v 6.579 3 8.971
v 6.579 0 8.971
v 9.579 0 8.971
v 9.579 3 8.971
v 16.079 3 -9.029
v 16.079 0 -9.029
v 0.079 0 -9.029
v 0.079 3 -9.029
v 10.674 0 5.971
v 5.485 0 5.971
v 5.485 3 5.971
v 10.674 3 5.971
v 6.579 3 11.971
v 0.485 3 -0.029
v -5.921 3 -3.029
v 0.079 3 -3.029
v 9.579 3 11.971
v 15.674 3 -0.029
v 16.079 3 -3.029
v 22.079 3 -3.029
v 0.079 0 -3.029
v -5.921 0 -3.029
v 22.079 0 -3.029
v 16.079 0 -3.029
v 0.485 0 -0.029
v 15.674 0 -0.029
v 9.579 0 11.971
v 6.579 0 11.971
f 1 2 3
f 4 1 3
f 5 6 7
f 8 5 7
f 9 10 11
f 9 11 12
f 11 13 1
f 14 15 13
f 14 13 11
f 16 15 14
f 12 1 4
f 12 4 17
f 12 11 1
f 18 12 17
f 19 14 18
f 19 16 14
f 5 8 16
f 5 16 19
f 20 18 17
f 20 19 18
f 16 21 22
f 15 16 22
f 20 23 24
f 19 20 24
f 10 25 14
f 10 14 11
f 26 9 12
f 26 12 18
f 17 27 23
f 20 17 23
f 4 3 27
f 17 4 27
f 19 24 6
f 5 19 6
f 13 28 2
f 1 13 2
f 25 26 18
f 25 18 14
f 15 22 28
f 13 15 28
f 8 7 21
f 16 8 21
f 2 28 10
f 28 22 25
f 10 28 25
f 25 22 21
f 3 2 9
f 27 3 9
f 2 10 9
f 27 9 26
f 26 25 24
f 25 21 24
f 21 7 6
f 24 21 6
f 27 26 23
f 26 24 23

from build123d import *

# Parameters (mm, degrees)
BOSS_EXTRUDE1_DEPTH = 3


with BuildPart() as part:
    # Sketch1 → Boss-Extrude1 (new body)
    with BuildSketch(Plane(origin=(0, 0, 0), x_dir=(1, 0, 0), z_dir=(0, 1, 0))):
        Polygon((22.079481216, 3.028725772), (16.079481216, 3.028725772), (16.079481216, 9.028725772), (0.079481216, 9.028725772), (0.079481216, 3.028725772), (-5.920518784, 3.028725772), (6.579481216, -11.971274228), (6.579481216, -8.971274228), (9.579481216, -8.971274228), (9.579481216, -11.971274228), align=None)
        Polygon((15.674356378, 0.028725772), (0.484606054, 0.028725772), (5.484606054, -5.971274228), (10.674356378, -5.971274228), align=None, mode=Mode.SUBTRACT)
    extrude(amount=BOSS_EXTRUDE1_DEPTH)


solid = part.part
